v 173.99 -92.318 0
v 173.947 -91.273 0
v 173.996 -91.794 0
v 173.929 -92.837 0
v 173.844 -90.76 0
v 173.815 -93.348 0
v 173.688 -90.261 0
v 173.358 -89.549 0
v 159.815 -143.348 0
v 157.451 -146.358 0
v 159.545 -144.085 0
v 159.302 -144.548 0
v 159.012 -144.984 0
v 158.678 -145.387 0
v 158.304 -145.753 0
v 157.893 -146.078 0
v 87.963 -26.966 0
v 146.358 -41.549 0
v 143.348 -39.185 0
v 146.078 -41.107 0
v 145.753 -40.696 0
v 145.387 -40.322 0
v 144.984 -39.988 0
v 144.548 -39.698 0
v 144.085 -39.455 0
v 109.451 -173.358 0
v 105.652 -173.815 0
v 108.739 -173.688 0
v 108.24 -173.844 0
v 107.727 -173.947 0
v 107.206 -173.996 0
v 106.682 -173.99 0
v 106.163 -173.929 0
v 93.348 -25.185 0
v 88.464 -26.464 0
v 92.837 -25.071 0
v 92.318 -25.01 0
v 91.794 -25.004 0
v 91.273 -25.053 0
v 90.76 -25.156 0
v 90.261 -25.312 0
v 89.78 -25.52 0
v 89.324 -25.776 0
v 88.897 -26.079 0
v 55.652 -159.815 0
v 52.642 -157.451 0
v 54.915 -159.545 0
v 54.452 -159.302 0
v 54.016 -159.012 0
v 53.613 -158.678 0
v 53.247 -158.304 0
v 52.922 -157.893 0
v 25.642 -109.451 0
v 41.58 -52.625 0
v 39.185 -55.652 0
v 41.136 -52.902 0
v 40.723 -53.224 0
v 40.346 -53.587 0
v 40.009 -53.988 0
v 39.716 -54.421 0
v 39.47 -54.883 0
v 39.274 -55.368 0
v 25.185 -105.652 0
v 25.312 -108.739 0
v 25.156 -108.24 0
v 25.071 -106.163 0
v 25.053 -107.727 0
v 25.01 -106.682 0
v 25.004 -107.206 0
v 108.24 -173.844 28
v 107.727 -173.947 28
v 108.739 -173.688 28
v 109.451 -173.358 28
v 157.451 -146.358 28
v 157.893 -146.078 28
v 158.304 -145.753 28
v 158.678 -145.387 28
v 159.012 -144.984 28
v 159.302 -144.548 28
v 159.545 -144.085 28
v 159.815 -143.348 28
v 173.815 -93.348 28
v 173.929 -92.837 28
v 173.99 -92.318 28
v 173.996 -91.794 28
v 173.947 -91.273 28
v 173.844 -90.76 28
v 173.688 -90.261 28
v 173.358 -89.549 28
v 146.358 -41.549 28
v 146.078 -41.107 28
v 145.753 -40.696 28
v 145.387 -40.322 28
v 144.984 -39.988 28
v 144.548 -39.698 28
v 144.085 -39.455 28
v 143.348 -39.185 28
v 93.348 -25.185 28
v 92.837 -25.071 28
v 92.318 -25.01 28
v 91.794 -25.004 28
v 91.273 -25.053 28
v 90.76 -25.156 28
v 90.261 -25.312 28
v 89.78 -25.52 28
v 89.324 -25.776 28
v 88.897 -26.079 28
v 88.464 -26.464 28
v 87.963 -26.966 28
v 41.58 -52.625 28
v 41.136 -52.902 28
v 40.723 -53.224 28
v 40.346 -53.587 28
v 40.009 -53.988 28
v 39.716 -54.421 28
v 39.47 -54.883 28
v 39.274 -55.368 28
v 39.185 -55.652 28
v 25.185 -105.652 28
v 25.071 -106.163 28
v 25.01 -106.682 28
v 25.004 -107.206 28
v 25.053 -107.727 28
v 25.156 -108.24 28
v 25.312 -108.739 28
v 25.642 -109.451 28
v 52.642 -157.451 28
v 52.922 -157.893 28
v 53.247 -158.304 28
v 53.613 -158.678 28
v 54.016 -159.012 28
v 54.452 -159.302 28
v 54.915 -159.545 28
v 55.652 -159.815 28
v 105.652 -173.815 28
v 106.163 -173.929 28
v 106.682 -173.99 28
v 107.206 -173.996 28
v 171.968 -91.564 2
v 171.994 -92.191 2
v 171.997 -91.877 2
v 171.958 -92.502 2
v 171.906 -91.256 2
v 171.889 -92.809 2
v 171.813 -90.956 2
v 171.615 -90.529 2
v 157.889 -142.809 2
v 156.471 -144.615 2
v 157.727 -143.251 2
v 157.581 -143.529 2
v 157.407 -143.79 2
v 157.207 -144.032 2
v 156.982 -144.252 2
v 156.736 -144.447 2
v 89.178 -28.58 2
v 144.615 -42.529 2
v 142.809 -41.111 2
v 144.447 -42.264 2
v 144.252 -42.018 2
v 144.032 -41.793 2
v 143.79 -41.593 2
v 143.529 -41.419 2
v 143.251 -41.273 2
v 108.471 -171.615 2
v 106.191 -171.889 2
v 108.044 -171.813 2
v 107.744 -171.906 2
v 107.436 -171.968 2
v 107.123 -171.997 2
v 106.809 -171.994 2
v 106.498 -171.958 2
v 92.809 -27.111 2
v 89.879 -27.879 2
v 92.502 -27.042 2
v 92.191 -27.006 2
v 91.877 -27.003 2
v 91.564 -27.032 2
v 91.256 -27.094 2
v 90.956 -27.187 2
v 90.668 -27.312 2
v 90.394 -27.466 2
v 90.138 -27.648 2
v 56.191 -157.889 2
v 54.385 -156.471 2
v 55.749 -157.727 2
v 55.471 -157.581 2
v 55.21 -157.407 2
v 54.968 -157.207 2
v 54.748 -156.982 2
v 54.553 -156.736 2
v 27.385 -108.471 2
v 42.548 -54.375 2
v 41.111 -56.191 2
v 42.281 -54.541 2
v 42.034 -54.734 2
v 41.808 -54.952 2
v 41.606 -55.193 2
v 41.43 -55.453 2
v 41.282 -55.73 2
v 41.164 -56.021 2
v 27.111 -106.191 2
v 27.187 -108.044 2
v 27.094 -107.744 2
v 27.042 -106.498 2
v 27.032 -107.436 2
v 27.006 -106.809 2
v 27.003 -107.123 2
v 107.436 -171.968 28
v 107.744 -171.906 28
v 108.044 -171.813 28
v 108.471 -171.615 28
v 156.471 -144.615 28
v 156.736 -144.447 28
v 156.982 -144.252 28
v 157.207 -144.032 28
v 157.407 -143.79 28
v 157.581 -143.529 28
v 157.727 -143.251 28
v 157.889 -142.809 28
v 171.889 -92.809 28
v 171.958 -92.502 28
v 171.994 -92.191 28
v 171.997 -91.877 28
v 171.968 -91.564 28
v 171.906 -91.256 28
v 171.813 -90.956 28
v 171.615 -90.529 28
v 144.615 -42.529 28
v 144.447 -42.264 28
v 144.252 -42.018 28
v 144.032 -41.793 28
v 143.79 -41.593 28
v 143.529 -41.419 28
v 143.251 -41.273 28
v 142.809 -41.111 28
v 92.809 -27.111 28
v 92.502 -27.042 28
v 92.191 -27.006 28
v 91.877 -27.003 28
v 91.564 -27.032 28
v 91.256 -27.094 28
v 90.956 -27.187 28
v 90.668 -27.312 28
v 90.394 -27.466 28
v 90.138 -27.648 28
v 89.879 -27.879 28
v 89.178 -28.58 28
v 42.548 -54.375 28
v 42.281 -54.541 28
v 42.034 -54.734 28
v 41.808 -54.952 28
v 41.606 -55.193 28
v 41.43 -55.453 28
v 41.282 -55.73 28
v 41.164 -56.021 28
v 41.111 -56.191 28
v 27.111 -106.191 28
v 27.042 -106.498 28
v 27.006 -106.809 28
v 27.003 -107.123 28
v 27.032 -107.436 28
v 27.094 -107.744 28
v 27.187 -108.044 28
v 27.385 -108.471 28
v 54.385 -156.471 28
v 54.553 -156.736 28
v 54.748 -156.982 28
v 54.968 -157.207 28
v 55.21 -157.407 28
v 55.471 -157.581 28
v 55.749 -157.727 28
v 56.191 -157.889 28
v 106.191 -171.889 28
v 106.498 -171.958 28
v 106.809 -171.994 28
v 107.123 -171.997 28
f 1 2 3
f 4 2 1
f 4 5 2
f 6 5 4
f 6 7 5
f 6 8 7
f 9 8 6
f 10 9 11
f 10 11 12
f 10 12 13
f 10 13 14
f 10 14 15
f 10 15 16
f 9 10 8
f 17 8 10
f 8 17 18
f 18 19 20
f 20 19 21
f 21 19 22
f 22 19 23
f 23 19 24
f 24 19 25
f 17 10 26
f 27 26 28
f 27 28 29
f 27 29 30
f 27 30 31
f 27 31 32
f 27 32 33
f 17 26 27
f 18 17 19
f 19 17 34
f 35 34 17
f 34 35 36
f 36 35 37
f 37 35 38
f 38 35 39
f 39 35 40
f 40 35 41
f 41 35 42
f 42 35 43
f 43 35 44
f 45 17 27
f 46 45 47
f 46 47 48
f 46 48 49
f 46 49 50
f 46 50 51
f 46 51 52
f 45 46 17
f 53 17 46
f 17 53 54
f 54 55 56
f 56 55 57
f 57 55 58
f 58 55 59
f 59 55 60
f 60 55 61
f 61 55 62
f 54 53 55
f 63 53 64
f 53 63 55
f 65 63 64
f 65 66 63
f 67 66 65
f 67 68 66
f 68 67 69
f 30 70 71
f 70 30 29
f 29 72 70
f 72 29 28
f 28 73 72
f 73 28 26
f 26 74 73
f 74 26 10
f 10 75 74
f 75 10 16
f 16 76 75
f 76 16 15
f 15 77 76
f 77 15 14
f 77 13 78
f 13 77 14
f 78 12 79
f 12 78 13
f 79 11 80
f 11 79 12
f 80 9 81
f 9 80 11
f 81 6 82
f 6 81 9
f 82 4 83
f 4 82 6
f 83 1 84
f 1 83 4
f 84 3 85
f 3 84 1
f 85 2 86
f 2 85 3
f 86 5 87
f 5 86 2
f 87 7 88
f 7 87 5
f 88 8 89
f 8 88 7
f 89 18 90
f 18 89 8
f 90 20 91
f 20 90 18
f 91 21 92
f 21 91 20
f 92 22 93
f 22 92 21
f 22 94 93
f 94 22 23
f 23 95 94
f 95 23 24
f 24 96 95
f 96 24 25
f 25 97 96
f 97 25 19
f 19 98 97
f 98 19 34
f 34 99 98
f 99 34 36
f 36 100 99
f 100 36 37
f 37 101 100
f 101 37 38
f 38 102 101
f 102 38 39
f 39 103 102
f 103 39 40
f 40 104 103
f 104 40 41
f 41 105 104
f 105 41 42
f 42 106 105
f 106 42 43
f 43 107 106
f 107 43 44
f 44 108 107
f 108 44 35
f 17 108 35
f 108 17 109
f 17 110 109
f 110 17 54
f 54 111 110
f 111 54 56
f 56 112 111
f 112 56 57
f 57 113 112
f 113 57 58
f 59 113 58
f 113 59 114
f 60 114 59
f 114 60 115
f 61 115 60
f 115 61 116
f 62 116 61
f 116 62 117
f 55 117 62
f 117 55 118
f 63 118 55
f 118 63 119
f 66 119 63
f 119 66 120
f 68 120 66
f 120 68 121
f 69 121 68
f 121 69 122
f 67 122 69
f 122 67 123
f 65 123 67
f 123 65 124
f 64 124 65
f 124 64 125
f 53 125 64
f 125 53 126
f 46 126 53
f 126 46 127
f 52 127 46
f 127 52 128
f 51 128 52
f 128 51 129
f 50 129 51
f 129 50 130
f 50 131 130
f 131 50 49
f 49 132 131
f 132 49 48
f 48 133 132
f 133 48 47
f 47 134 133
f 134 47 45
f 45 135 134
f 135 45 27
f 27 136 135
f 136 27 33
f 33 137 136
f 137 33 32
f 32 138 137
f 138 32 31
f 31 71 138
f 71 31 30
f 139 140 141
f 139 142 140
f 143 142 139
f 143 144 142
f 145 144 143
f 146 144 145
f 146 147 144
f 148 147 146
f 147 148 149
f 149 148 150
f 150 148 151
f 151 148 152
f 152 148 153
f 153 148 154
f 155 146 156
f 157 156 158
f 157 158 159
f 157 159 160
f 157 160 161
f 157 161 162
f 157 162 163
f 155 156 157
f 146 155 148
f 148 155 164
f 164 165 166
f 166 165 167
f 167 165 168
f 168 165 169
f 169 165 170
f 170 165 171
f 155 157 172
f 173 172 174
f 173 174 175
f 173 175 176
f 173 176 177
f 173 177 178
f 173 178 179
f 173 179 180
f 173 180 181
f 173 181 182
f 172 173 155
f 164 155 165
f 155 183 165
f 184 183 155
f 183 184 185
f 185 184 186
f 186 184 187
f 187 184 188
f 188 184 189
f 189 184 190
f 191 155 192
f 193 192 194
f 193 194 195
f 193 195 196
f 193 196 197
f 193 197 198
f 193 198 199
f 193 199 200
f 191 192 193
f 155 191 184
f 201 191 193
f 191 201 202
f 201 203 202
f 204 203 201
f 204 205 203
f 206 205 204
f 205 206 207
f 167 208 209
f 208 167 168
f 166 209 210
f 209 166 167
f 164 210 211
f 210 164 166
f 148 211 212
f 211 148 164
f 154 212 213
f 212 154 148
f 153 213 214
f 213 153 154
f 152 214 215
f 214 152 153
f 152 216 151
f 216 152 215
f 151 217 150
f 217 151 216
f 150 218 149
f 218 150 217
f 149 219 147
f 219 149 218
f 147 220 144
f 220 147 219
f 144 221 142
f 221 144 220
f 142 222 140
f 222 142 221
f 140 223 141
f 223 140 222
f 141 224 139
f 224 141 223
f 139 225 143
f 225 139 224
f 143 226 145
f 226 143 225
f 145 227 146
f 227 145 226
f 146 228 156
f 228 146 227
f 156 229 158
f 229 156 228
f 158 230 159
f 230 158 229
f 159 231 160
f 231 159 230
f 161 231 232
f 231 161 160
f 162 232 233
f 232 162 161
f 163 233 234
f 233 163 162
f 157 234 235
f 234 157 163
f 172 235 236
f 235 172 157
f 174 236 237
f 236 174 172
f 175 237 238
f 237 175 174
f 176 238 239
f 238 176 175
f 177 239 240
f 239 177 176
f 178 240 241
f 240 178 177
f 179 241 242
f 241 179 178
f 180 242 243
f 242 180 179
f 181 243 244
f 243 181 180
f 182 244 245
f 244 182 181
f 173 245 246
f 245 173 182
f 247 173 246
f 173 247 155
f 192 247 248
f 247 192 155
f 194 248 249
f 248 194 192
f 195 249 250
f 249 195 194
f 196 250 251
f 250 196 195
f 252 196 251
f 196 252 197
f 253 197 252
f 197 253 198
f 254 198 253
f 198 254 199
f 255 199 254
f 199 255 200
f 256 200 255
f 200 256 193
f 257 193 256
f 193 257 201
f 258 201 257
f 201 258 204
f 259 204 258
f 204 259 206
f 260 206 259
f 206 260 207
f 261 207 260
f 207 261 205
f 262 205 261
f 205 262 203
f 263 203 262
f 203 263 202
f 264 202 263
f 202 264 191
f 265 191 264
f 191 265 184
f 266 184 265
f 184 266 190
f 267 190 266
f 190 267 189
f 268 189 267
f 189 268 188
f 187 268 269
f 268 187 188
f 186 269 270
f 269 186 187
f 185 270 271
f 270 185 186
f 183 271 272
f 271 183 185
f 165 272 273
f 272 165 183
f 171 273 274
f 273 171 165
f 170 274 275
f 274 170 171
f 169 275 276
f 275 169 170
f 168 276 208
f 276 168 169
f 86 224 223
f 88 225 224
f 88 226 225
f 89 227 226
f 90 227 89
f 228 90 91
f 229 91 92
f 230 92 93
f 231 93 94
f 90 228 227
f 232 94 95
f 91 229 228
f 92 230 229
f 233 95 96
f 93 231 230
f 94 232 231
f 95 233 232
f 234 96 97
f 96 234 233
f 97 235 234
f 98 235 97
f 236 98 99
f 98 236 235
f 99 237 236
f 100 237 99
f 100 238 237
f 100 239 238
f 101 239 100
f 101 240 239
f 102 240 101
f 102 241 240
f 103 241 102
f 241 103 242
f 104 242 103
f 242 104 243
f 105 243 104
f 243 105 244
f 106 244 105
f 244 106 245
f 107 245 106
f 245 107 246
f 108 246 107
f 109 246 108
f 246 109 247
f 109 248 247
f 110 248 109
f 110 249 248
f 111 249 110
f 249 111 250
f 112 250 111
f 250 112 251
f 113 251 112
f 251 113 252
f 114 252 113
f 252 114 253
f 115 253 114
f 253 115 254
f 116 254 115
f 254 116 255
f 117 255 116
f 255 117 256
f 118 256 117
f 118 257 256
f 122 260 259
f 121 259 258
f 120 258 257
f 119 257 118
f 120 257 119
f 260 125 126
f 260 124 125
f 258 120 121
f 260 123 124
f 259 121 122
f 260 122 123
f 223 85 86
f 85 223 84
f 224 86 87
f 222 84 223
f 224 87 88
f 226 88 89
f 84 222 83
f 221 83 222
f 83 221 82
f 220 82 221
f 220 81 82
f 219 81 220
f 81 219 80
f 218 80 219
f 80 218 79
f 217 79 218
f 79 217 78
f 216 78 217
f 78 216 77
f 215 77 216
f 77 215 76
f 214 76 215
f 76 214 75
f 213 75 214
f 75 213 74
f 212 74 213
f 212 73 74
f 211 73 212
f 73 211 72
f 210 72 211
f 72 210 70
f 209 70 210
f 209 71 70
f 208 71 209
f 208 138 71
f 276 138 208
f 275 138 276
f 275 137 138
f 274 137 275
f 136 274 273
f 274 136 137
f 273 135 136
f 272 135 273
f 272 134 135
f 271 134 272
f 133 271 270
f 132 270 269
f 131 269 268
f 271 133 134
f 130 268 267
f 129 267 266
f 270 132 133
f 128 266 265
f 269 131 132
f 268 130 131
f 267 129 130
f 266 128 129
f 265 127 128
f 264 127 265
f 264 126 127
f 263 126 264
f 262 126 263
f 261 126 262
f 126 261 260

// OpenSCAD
// AUTOMATICALLY GENERATED BY SCOTT ENGINE (Node.js)
// Source: test_circle.png
// Points: 9
$fn = 60;

// --- Configuration ---
Render_Mode = "Body"; // Options: "Body", "Lid"
Sign_Height = 30;
Wall_Thickness = 2;
Base_Thickness = 2;
Lid_Tolerance = 0.15;

// -- Engineering Constants --
CW = ("silicone_neon_6mm" == "silicone_neon_6mm") ? 6.0 : 8.0; 
Lip_Overhang = 0.4;

module core_shape() {
    // Scott-Peucker Optimized Vector Path
    polygon(points=[[92,-30],[142,-44],[169,-92],[155,-142],[107,-169],[57,-155],[30,-107],[44,-57],[91,-31]]);
}

module body_geometry() {
    difference() {
        linear_extrude(Sign_Height) offset(r = CW/2 + Wall_Thickness) core_shape();
        translate([0, 0, Base_Thickness]) linear_extrude(Sign_Height + 1) offset(r = CW/2) core_shape();
        
        // Friction Lip for Snap-Fit
        translate([0, 0, Sign_Height - 2.0]) linear_extrude(3.0)
            difference() {
                offset(r = CW/2 + 5) core_shape();
                offset(r = CW/2 - Lip_Overhang) core_shape();
            }
    }
}

module lid_geometry() {
    linear_extrude(2.0) offset(r = (CW/2 + 1.5) - Lid_Tolerance) core_shape();
}

if (Render_Mode == "Body") { body_geometry(); }
else { lid_geometry(); }
